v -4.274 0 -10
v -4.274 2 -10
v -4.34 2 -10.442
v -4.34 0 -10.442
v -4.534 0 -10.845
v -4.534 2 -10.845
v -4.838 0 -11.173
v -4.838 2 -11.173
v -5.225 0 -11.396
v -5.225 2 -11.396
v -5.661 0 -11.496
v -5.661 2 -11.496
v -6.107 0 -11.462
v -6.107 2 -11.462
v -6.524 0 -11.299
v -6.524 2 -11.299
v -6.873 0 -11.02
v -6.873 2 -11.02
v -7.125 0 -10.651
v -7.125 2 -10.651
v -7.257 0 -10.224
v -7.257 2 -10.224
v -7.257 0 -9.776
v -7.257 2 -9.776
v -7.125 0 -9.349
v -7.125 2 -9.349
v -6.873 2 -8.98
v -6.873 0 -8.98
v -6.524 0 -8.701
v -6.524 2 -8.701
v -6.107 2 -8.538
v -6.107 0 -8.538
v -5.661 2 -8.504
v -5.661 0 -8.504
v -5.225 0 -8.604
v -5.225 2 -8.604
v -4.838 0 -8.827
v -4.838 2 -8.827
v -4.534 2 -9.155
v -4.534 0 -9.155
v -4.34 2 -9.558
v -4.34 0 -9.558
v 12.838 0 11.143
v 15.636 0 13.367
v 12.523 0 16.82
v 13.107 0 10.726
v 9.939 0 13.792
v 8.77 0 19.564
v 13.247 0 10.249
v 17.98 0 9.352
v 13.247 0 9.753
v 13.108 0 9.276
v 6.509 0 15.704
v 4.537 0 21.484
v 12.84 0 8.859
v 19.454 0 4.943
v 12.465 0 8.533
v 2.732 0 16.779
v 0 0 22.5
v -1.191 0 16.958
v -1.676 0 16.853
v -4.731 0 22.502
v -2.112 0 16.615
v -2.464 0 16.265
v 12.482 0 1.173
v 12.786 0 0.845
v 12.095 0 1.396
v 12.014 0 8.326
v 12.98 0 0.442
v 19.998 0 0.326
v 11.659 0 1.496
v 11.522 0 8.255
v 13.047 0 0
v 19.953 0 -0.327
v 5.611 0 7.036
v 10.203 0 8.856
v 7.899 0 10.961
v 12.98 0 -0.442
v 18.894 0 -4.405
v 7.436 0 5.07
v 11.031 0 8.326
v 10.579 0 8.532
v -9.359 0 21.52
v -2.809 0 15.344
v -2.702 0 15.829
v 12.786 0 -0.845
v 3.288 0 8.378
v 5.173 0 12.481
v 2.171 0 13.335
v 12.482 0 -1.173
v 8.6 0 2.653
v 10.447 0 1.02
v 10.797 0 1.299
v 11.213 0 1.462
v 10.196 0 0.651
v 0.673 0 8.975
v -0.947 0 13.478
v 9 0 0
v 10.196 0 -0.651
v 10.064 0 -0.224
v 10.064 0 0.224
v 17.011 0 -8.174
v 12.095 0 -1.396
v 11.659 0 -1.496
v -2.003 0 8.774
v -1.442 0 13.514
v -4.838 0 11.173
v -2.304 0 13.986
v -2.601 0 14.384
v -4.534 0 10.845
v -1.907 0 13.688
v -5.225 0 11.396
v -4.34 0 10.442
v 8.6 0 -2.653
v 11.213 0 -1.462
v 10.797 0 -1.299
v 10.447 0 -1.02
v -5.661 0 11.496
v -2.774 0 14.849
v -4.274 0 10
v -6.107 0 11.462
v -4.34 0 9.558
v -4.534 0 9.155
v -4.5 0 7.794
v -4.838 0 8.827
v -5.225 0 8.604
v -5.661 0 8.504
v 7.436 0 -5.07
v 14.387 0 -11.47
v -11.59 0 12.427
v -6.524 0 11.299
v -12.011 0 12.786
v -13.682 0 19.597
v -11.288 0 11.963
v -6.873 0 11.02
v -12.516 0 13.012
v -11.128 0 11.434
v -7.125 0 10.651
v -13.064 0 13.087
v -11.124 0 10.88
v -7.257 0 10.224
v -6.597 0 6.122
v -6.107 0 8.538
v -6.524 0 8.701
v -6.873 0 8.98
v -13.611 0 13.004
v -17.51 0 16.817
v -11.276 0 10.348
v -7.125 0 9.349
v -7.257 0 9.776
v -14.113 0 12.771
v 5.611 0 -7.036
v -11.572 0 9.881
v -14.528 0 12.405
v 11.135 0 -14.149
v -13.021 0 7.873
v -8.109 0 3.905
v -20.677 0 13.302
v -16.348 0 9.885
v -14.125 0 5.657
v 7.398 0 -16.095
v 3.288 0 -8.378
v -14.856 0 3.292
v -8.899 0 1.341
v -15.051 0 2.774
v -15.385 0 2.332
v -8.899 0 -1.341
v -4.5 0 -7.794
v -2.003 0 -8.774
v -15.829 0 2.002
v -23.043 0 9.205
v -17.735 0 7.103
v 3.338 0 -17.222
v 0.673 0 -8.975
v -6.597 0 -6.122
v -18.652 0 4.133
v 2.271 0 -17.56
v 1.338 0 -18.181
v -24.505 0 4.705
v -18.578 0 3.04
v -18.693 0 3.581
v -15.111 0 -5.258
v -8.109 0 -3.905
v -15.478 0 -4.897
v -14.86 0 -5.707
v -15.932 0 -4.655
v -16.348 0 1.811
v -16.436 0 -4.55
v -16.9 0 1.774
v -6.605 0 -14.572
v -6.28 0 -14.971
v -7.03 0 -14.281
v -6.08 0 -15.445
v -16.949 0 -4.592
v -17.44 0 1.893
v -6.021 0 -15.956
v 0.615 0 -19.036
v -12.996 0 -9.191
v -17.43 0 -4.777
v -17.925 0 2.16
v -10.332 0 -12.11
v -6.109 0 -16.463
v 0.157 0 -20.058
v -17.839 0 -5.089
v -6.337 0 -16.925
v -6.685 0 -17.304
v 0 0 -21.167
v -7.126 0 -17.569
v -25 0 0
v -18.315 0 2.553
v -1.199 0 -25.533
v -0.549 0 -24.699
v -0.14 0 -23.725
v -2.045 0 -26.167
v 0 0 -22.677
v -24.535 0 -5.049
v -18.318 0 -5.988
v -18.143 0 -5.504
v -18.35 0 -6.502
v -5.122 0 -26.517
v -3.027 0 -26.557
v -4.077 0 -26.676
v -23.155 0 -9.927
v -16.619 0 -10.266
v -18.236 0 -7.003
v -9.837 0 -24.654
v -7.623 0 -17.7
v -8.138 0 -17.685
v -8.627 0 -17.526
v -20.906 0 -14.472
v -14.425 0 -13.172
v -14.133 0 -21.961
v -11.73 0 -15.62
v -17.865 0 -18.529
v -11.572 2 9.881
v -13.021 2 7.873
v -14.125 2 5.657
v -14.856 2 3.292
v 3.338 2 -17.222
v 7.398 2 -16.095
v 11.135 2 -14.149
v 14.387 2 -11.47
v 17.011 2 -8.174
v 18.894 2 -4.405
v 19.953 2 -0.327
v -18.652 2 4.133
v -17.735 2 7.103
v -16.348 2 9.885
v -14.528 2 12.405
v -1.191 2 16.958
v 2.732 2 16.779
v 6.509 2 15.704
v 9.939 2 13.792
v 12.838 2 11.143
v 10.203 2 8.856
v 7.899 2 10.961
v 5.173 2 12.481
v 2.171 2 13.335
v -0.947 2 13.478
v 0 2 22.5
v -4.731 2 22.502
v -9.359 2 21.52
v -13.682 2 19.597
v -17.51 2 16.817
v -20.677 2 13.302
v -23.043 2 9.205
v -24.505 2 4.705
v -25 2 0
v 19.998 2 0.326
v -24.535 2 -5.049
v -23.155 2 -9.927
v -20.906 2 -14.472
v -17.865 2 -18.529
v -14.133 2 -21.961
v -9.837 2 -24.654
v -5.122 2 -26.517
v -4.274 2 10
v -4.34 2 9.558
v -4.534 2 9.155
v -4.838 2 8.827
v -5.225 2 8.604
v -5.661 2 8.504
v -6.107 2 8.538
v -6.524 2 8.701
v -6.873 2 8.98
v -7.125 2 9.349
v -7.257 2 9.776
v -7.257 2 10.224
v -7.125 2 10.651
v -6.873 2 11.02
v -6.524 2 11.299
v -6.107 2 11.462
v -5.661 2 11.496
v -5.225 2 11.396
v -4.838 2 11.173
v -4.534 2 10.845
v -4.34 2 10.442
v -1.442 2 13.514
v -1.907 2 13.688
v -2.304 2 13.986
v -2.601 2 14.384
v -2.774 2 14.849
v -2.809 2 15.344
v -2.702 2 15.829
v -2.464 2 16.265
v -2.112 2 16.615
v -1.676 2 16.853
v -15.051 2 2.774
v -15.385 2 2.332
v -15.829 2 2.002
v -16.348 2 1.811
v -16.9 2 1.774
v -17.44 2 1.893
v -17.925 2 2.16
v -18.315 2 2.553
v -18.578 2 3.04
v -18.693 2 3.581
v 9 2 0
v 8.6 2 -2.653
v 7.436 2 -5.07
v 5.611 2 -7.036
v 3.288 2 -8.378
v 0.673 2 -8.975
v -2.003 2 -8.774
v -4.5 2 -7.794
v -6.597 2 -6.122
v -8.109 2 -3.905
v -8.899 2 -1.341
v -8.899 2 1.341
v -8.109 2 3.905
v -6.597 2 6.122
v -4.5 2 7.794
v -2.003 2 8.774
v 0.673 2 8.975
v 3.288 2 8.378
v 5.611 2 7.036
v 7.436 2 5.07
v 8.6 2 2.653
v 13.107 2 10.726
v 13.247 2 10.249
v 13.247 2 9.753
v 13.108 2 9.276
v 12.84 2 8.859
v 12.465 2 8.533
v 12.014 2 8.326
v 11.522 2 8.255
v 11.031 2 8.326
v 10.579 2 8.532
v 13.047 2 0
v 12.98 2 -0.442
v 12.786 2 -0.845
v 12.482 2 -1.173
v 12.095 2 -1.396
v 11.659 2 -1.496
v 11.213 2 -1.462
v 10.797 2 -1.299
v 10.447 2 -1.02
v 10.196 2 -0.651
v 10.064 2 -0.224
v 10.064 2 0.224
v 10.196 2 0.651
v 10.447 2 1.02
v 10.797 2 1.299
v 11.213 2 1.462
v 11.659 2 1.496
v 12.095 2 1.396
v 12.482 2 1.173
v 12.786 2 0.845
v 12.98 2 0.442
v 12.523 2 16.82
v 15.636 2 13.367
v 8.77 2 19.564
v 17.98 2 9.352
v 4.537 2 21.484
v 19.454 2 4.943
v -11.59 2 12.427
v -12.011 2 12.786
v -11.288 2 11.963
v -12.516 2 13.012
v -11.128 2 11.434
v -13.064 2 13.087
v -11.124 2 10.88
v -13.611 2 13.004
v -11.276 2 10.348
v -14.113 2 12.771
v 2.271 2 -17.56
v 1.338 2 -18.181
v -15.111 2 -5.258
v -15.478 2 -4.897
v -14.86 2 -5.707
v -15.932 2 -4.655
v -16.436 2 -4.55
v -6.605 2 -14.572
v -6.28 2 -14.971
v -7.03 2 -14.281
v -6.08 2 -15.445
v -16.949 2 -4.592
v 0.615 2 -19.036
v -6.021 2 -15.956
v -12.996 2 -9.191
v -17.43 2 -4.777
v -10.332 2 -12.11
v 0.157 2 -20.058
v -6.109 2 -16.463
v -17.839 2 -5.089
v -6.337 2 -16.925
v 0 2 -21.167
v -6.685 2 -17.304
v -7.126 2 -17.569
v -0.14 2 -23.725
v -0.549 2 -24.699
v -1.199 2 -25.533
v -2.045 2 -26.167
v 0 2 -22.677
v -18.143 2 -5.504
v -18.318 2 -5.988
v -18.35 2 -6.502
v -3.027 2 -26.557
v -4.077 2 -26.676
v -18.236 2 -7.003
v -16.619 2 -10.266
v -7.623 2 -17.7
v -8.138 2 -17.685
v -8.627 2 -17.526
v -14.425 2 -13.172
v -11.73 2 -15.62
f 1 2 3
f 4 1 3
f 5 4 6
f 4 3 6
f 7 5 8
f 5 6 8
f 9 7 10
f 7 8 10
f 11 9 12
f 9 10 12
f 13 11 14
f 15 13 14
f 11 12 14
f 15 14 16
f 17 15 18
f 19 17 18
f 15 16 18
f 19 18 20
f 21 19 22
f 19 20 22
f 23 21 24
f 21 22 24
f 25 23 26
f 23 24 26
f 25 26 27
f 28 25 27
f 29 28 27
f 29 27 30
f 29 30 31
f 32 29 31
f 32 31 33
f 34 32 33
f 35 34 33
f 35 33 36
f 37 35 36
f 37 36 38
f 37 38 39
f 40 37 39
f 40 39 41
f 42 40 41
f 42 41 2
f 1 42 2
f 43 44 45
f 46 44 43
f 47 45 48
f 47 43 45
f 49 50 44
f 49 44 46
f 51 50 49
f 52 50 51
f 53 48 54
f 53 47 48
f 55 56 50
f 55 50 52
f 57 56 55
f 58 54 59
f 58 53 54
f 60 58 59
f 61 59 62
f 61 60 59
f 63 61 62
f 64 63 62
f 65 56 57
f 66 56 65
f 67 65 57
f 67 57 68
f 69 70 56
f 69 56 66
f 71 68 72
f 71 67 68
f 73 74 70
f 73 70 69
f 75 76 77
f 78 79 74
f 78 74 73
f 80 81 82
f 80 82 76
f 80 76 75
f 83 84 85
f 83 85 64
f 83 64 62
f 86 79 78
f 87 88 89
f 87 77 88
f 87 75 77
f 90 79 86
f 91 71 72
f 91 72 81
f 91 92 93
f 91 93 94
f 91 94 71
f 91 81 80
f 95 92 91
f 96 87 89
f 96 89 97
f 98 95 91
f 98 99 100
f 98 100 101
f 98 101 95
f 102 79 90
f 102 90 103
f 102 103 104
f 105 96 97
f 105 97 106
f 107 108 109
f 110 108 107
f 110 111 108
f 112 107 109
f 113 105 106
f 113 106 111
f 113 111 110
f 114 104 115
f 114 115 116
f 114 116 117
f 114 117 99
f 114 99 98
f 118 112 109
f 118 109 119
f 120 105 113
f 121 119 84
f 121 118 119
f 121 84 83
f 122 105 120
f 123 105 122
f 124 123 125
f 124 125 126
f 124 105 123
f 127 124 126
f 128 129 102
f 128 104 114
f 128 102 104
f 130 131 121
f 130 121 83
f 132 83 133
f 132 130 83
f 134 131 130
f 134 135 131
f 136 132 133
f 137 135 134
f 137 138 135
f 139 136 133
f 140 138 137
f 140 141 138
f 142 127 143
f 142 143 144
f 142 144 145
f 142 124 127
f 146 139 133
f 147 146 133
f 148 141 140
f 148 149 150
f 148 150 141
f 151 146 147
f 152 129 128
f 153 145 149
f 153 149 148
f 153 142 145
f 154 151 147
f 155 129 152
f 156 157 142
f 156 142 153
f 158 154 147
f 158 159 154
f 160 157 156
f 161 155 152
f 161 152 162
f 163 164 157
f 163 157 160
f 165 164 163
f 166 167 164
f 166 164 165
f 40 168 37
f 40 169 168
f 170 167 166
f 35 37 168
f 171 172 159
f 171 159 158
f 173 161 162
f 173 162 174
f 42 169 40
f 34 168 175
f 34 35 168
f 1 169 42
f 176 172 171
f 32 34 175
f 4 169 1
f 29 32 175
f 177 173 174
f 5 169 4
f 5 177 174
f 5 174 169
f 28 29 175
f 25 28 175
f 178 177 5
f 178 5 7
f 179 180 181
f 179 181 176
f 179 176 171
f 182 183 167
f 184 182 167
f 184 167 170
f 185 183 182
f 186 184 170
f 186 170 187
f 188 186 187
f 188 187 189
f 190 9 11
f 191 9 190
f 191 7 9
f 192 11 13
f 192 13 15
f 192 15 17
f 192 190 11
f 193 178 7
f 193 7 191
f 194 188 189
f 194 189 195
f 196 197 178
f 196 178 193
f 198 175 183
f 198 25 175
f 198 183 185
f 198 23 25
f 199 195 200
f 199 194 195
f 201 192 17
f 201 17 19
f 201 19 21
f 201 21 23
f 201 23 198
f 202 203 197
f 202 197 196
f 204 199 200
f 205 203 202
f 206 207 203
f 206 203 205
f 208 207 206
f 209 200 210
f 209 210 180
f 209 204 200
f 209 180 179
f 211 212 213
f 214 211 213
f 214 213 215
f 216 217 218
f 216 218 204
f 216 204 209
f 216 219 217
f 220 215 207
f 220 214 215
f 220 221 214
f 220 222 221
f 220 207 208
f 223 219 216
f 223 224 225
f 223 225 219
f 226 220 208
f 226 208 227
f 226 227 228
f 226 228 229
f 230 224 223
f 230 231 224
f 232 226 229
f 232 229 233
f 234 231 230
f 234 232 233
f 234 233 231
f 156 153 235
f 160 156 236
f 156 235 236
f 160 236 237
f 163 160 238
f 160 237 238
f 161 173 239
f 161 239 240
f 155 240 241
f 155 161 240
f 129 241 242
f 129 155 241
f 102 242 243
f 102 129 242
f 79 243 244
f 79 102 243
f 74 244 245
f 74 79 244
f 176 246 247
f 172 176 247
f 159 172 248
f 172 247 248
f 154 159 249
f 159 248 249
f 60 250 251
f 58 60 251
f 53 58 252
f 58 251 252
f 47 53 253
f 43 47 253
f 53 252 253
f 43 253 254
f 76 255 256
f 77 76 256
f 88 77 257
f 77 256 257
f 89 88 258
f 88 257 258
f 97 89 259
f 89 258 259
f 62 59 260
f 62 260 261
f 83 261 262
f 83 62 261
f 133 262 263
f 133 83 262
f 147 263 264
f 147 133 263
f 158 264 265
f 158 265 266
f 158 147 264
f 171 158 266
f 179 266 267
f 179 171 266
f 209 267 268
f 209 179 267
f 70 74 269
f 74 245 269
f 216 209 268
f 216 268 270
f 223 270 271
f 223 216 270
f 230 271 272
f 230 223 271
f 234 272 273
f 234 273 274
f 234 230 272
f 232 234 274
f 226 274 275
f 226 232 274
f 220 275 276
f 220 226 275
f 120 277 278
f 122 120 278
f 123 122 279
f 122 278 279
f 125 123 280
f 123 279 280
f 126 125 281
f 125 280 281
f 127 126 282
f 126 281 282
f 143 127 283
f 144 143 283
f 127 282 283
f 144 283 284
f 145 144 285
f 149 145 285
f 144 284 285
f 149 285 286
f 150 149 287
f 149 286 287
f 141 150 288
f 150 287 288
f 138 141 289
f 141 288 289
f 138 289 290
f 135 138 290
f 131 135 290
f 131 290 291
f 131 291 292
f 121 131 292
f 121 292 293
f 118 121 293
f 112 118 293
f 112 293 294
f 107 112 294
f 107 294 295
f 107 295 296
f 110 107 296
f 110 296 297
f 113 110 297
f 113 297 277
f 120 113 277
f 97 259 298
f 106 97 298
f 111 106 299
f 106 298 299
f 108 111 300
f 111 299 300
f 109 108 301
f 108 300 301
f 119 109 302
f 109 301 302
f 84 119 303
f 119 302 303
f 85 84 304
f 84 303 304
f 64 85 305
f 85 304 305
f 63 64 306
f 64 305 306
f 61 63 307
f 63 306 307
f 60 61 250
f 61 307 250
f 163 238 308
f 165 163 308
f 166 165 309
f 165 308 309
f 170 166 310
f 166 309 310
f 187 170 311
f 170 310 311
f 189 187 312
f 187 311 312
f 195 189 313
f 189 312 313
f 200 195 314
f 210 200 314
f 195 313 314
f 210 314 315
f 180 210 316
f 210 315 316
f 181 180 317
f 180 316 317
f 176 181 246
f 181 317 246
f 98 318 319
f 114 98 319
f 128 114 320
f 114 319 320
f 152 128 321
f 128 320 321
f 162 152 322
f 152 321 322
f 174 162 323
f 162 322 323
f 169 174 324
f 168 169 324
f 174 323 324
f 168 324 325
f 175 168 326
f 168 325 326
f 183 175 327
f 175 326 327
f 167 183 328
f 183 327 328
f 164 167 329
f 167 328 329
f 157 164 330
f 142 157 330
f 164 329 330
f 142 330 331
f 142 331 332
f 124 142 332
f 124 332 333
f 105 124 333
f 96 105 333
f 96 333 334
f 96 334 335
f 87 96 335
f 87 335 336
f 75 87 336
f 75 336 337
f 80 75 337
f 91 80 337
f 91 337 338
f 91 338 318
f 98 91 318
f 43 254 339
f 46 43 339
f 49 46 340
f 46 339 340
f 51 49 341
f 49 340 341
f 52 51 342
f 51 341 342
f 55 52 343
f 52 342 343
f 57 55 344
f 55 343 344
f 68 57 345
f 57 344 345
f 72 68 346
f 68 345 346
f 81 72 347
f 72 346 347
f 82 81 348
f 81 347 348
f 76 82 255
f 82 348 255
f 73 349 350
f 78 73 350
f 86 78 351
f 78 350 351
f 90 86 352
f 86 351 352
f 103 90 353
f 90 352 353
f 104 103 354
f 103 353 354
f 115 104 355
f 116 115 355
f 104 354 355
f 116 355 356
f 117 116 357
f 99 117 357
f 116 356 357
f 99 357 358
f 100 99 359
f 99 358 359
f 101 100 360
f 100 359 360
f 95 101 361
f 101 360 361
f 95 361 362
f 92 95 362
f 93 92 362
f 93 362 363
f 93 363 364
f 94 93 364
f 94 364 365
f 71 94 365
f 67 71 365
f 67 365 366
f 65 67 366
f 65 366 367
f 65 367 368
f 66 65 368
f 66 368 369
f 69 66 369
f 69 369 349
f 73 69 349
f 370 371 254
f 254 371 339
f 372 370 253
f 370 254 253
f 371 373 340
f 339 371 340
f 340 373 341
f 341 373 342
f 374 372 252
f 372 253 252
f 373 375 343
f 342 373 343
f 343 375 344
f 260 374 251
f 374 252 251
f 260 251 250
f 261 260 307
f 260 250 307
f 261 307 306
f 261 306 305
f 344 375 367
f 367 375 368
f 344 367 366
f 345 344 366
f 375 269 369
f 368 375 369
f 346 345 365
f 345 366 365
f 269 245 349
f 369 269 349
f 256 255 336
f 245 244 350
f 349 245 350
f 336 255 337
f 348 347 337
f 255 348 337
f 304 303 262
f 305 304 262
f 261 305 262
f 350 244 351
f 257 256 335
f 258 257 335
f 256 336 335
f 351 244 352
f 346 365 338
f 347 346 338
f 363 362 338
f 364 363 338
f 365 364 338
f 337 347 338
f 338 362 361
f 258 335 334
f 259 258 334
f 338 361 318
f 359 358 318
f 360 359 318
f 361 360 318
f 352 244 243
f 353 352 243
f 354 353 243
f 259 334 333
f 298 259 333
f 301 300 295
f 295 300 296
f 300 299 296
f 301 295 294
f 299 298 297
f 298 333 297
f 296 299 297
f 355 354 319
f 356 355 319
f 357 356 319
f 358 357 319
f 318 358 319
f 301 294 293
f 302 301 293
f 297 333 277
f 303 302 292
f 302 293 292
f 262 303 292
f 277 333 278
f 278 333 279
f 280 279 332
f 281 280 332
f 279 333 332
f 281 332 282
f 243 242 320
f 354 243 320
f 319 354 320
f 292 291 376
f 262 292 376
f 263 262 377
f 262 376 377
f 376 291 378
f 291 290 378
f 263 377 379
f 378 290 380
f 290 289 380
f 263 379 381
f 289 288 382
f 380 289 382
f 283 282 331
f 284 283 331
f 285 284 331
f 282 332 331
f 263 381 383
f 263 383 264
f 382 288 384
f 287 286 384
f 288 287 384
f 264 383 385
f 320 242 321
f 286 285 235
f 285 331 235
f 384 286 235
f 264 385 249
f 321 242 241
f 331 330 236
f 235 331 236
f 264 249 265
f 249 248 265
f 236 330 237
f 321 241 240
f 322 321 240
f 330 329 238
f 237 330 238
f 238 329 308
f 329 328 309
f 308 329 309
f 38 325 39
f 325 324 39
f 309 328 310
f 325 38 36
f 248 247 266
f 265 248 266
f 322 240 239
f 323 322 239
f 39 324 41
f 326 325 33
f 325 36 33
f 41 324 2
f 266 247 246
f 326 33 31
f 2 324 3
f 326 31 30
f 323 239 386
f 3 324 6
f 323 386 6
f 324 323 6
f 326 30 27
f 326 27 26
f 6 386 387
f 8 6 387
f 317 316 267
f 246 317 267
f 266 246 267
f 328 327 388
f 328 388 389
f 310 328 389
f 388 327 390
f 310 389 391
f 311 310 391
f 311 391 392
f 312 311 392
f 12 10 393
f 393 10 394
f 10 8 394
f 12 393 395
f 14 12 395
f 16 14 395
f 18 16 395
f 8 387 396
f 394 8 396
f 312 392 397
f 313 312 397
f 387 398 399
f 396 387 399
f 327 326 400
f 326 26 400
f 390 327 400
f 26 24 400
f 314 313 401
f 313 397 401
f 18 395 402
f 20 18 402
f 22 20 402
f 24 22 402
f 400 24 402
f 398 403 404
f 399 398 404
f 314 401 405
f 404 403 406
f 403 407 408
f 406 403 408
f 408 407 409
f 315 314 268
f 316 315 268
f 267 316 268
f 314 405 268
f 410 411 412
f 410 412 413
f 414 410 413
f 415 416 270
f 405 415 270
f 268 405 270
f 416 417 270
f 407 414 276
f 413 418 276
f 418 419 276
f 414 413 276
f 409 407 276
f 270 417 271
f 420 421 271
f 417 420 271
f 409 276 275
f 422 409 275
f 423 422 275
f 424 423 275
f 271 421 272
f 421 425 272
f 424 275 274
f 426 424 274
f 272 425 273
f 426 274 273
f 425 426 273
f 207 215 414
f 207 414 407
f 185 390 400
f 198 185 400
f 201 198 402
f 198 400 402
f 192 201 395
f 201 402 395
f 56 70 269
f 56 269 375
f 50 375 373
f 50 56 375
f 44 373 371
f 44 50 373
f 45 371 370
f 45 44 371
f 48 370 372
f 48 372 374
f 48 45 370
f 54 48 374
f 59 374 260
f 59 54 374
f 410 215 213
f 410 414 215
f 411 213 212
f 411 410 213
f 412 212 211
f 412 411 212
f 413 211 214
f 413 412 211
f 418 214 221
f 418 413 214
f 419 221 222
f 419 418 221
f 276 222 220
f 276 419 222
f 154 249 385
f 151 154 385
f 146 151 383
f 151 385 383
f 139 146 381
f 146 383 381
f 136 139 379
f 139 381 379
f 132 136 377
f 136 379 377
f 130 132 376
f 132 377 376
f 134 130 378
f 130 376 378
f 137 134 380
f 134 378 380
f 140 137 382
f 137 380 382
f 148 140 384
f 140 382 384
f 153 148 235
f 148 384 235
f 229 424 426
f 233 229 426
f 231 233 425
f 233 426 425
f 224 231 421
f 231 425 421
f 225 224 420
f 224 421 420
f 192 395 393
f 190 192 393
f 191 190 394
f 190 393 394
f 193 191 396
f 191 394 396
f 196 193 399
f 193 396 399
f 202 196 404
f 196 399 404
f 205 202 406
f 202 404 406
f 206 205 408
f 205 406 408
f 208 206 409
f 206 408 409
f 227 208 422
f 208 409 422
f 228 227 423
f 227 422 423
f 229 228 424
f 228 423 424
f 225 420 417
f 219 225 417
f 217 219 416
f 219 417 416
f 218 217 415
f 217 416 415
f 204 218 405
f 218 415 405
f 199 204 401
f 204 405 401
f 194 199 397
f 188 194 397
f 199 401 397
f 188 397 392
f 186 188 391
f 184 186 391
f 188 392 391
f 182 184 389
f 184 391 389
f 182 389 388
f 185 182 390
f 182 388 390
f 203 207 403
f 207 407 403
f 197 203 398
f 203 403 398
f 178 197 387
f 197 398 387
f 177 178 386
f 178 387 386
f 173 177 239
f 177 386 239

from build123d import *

# Parameters (mm, degrees)
BOSS_EXTRUDE1_DEPTH = 2
SKETCH2_R           = 9
CUT_EXTRUDE1_DEPTH  = 3
FILLET1_R           = 4
SKETCH4_R           = 1.5
CUT_EXTRUDE2_DEPTH  = 3.0000001
CUT_EXTRUDE3_DEPTH  = 3.0000001


with BuildPart() as part:
    # Sketch1 → Boss-Extrude1 (new body)
    with BuildSketch(Plane(origin=(0, 0, 0), x_dir=(1, 0, 0), z_dir=(0, 1, 0))):
        with BuildLine():
            Line((0, 27.5), (0, 17.5))
            ThreePointArc((0, 17.5), (13.287682266, 12.507351161), (20, 0))
            ThreePointArc((20, 0), (14.277242376, -15.051993223), (0, -22.5))
            ThreePointArc((0, -22.5), (-17.510327053, -16.817030059), (-25, 0))
            ThreePointArc((-25, 0), (-17.815844528, 18.582585934), (0, 27.5))
        make_face()
    extrude(amount=BOSS_EXTRUDE1_DEPTH)

    # Sketch2 → Cut-Extrude1 (cut, through all)
    with BuildSketch(Plane(origin=(0, 2, 0), x_dir=(1, 0, 0), z_dir=(0, 1, 0))):
        Circle(SKETCH2_R)
    extrude(amount=-CUT_EXTRUDE1_DEPTH, mode=Mode.SUBTRACT)

    # Fillet1
    fillet1_edges = [part.edges().sort_by_distance(p)[0] for p in [
        (0, 1, -27.5),
        (0, 1, -17.5),
        (20, 1, 0),
        (0, 1, 22.5),
    ]]
    fillet(fillet1_edges, radius=FILLET1_R)

    # Sketch4 → Cut-Extrude2 (cut, through all)
    with BuildSketch(Plane(origin=(0, 2, 0), x_dir=(1, 0, 0), z_dir=(0, 1, 0))):
        with Locations((-5.773502692, 10)):
            Circle(SKETCH4_R)
        with Locations((11.547005384, 0)):
            Circle(SKETCH4_R)
        with Locations((-5.773502692, -10)):
            Circle(SKETCH4_R)
    extrude(amount=-CUT_EXTRUDE2_DEPTH, mode=Mode.SUBTRACT)

    # Sketch5 → Cut-Extrude3 (cut, through all)
    with BuildSketch(Plane(origin=(0, 2, 0), x_dir=(1, 0, 0), z_dir=(0, 1, 0))):
        with BuildLine():
            ThreePointArc((-18.651783434, -4.132756796), (-17.097956543, -8.522240669), (-14.528379596, -12.405437933))
            ThreePointArc((-14.528379596, -12.405437933), (-11.787650951, -12.621464013), (-11.571624871, -9.880735369))
            ThreePointArc((-11.571624871, -9.880735369), (-13.618252323, -6.787830084), (-14.855850898, -3.291675511))
            ThreePointArc((-14.855850898, -3.291675511), (-17.174357809, -1.814249886), (-18.651783434, -4.132756796))
        make_face()
        with BuildLine():
            ThreePointArc((-1.191040224, -16.957696658), (6.508856337, -15.704039033), (12.837977748, -11.143086651))
            ThreePointArc((12.837977748, -11.143086651), (12.664068084, -8.682433661), (10.203415094, -8.856343325))
            ThreePointArc((10.203415094, -8.856343325), (5.173132739, -12.481313807), (-0.946619322, -13.477700417))
            ThreePointArc((-0.946619322, -13.477700417), (-2.808827894, -15.095488087), (-1.191040224, -16.957696658))
        make_face()
        with BuildLine():
            ThreePointArc((-8.627267861, 17.525882988), (-14.425164825, 13.171975745), (-18.235670183, 7.003331939))
            ThreePointArc((-18.235670183, 7.003331939), (-17.195996196, 4.667190222), (-14.859854479, 5.706864208))
            ThreePointArc((-14.859854479, 5.706864208), (-11.754755816, 10.733559053), (-7.03017458, 14.281464197))
            ThreePointArc((-7.03017458, 14.281464197), (-6.206511825, 16.702220233), (-8.627267861, 17.525882988))
        make_face()
    extrude(amount=-CUT_EXTRUDE3_DEPTH, mode=Mode.SUBTRACT)


solid = part.part
